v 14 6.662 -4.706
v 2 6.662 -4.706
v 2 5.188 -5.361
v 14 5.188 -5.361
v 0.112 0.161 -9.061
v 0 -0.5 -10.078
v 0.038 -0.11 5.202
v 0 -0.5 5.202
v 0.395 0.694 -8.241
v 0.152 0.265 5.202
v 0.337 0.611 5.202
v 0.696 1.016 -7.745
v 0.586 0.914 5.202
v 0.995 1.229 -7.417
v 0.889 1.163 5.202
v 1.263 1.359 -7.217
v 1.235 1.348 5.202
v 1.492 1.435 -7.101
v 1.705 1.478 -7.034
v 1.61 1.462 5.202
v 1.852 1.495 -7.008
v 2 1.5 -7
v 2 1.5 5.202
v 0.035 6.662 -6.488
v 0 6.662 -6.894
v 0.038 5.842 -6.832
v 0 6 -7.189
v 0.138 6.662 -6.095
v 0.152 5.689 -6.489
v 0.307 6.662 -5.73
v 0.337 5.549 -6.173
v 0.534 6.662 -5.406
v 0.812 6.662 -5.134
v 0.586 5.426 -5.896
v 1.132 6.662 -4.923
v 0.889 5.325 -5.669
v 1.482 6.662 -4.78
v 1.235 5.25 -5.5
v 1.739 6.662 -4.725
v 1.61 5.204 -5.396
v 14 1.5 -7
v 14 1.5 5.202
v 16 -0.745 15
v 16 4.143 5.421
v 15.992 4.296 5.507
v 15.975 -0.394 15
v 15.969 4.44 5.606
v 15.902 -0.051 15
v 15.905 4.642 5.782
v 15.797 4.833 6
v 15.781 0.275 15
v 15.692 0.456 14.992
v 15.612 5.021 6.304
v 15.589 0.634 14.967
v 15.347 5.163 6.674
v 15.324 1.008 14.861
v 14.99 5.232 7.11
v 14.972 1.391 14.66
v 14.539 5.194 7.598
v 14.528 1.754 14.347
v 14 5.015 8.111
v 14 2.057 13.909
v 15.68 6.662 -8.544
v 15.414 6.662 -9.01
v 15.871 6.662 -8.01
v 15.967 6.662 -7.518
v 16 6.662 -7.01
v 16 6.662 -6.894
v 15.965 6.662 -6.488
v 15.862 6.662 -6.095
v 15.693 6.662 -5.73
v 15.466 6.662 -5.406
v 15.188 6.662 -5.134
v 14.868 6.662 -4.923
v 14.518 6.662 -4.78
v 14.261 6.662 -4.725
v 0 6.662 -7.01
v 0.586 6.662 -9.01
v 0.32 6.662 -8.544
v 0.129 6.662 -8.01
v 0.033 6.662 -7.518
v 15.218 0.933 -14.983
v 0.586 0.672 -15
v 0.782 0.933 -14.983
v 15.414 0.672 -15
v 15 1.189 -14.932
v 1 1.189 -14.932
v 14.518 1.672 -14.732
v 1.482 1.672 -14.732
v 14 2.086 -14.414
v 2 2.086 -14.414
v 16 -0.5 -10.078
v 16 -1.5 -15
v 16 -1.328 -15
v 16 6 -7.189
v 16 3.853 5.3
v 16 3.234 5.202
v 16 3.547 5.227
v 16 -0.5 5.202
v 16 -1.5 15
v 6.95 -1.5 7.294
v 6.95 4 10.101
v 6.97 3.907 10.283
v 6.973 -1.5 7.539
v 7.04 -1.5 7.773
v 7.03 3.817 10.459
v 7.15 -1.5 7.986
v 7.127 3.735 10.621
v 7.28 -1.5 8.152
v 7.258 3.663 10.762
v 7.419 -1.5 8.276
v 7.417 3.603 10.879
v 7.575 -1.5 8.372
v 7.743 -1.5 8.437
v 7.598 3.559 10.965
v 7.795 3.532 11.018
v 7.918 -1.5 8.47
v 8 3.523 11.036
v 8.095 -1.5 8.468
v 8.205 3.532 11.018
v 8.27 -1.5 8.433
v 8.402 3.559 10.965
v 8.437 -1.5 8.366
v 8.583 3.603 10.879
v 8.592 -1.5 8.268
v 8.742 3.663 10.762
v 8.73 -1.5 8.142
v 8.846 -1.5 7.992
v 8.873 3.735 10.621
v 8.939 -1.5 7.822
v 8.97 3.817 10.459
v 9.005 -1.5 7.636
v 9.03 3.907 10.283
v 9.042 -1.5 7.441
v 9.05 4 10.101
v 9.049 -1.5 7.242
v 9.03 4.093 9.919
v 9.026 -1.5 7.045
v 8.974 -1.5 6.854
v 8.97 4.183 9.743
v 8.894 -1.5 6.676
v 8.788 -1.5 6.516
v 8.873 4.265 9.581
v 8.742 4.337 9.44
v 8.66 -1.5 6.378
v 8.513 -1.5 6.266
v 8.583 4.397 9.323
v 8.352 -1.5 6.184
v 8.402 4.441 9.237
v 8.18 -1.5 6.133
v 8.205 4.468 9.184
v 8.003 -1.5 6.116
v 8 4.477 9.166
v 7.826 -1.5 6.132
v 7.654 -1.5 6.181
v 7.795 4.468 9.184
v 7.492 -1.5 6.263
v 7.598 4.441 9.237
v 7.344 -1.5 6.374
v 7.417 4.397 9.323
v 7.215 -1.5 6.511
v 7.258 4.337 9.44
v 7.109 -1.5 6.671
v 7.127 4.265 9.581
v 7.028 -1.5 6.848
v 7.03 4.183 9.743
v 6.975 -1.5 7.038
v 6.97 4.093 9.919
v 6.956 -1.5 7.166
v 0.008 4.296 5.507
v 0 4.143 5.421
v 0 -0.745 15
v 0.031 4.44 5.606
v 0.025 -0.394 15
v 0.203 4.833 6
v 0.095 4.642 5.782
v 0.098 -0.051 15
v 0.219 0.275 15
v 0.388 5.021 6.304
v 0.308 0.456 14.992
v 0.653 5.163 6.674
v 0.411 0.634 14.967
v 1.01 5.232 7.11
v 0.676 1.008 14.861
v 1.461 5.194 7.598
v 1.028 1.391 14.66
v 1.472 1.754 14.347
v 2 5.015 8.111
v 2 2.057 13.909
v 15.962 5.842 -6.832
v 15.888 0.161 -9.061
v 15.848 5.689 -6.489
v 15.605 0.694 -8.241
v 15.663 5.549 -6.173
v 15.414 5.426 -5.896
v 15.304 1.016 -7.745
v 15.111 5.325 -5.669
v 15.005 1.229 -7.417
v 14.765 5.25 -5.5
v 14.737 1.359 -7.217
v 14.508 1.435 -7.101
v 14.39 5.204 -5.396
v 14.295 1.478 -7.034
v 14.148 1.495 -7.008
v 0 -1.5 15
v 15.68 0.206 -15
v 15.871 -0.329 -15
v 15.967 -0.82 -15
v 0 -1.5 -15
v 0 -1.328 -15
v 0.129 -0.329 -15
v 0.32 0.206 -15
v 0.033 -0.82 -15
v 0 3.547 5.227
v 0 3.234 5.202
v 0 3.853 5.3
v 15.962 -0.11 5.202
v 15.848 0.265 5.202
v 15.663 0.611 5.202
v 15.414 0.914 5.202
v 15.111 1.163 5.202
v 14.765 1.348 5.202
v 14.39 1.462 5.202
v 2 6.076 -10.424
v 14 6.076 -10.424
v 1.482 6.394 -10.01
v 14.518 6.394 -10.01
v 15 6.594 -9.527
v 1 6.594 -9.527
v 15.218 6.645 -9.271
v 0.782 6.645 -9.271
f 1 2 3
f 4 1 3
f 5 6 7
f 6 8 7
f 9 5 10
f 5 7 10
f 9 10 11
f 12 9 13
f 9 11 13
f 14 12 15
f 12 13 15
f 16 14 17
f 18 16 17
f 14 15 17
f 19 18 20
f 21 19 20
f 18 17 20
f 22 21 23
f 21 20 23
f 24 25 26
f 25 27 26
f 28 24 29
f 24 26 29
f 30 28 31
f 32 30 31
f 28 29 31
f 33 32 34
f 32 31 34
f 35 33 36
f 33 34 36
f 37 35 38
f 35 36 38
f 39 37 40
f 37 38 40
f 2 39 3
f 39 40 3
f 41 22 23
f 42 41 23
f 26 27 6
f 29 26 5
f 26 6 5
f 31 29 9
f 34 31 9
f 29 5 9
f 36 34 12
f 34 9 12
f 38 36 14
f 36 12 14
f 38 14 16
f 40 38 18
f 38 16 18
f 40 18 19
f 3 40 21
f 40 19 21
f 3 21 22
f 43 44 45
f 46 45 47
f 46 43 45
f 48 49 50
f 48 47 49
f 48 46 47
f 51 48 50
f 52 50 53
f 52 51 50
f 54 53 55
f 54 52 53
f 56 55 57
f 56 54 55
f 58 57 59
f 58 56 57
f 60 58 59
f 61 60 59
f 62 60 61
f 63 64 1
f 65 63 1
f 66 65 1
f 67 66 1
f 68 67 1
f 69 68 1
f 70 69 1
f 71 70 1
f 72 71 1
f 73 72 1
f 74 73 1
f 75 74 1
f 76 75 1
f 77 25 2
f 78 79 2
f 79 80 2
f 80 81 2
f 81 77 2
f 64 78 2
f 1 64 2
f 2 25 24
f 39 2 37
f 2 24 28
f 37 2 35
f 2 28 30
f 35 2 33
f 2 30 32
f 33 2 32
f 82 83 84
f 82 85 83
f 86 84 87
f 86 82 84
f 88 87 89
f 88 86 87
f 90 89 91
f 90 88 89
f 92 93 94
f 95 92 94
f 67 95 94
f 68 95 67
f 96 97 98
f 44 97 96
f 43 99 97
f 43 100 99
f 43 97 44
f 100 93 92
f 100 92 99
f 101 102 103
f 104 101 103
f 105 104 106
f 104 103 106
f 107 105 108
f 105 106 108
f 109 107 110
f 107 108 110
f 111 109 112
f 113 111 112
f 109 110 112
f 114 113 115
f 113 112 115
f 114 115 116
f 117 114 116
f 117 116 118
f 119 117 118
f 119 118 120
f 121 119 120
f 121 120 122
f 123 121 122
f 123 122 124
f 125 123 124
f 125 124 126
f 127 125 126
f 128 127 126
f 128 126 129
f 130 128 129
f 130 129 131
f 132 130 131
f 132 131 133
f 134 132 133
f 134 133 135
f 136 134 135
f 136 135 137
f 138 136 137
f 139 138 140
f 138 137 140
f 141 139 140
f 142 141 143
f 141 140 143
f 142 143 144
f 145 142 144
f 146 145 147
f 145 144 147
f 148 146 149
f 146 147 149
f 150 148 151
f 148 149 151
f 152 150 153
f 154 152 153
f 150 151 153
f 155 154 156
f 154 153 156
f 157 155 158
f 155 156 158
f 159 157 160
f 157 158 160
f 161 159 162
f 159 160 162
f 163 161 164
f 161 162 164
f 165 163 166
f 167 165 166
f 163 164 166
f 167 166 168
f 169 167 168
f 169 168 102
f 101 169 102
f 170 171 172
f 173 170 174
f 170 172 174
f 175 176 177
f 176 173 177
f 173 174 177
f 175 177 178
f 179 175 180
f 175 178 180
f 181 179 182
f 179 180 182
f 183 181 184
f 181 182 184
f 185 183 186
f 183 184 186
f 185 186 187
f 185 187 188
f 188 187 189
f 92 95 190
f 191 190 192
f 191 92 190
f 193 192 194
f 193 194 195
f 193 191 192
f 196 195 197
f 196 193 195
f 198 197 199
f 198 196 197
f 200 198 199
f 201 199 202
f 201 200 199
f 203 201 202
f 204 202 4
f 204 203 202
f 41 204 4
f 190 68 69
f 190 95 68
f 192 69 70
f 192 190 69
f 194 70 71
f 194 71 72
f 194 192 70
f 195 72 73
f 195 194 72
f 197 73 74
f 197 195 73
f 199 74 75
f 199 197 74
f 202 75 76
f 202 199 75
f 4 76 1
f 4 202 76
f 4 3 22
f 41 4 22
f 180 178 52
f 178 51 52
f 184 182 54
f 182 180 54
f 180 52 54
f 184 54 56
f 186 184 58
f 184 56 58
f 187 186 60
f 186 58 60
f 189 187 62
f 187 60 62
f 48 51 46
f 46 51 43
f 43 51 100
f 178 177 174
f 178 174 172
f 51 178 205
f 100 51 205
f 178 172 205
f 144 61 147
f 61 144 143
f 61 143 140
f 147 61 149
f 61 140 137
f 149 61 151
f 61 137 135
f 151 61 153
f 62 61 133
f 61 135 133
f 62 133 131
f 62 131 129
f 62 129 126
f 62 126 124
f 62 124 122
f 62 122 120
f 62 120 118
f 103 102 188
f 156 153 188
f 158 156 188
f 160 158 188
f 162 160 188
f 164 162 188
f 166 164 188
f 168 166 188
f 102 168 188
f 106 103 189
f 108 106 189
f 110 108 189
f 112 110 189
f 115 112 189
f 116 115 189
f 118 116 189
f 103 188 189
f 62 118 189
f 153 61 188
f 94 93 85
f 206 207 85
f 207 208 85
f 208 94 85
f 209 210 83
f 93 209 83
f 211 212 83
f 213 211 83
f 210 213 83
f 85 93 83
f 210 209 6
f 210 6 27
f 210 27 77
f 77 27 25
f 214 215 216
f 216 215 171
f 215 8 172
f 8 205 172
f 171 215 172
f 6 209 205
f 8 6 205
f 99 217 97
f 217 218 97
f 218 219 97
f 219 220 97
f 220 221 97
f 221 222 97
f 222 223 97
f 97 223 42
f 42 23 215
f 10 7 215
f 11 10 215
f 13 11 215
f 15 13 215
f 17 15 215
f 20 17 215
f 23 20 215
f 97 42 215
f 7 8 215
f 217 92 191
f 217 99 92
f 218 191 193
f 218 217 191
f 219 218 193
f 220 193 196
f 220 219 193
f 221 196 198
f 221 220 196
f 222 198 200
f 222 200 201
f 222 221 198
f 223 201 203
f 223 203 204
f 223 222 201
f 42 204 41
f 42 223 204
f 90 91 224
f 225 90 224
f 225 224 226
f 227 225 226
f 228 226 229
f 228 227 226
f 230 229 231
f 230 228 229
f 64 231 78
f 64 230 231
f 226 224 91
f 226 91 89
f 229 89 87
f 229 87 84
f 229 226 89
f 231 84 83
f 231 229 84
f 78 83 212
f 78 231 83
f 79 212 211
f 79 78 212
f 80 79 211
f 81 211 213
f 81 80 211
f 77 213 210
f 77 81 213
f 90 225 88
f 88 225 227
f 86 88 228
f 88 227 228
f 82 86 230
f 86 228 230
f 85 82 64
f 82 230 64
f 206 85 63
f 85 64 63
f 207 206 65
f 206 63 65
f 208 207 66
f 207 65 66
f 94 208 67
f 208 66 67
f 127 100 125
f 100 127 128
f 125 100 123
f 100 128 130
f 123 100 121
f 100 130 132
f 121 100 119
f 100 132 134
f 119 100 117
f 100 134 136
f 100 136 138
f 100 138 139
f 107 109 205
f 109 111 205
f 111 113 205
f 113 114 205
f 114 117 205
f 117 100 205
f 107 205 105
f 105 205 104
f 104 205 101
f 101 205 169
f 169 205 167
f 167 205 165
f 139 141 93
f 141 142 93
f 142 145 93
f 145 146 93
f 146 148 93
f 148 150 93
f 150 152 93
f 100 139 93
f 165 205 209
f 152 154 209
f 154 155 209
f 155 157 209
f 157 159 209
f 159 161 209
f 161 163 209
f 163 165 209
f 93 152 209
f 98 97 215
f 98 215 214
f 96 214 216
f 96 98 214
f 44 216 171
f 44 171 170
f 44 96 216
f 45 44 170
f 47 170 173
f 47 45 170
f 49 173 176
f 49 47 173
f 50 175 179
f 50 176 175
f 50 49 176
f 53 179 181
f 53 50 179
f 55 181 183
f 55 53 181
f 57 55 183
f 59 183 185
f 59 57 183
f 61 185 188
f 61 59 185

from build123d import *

# Parameters (mm, degrees)
F1_DEPTH = 16
F2_R     = 1.05
F3_DEPTH = 7.7105812745
F4_R     = 2


with BuildPart() as f1:
    # F0 (on Right) → F1 (new body)
    with BuildSketch(Plane.YZ):
        Polygon((-1.5, -15), (1.5, -15), (1.5, -7), (1.5, -3), (1.5, 5.2020410289), (1.5, 15), (-1.5, 15), align=None)
        Polygon((6.5, 5.2020410289), (1.5, 15), (1.5, 5.2020410289), align=None)
        Polygon((1.5, -7), (1.5, -15), (6.6618086312, -9.8381913688), (6.6618086312, -4.7058628306), (5.187990124, -5.3608932782), align=None)
    extrude(amount=F1_DEPTH)

    # F2 (on face) → F3 (cut, up to face)
    with BuildSketch(Plane(origin=(0, 7.2631977094, 3.7064850602), x_dir=(-1, 0, 0), z_dir=(0, 0.8907235428, 0.4545454545))):
        with Locations((-8, 7.1790349606)):
            Circle(F2_R)
    extrude(amount=-F3_DEPTH, mode=Mode.SUBTRACT)

    # F4
    f4_edges = [f1.edges().sort_by_distance(p)[0] for p in [
        (16, 1.5, -0.898979),
        (0, 1.5, -0.898979),
        (16, 4, 10.101021),
        (0, 4, 10.101021),
        (8, 6.5, 5.202041),
        (8, 6.661809, -9.838191),
        (16, 4.080904, -12.419096),
        (0, 4.080904, -12.419096),
        (16, 4.080904, -5.852931),
        (0, 4.080904, -5.852931),
        (8, 1.5, 15),
        (8, 1.5, -15),
    ]]
    fillet(f4_edges, radius=F4_R)


solid = f1.part
